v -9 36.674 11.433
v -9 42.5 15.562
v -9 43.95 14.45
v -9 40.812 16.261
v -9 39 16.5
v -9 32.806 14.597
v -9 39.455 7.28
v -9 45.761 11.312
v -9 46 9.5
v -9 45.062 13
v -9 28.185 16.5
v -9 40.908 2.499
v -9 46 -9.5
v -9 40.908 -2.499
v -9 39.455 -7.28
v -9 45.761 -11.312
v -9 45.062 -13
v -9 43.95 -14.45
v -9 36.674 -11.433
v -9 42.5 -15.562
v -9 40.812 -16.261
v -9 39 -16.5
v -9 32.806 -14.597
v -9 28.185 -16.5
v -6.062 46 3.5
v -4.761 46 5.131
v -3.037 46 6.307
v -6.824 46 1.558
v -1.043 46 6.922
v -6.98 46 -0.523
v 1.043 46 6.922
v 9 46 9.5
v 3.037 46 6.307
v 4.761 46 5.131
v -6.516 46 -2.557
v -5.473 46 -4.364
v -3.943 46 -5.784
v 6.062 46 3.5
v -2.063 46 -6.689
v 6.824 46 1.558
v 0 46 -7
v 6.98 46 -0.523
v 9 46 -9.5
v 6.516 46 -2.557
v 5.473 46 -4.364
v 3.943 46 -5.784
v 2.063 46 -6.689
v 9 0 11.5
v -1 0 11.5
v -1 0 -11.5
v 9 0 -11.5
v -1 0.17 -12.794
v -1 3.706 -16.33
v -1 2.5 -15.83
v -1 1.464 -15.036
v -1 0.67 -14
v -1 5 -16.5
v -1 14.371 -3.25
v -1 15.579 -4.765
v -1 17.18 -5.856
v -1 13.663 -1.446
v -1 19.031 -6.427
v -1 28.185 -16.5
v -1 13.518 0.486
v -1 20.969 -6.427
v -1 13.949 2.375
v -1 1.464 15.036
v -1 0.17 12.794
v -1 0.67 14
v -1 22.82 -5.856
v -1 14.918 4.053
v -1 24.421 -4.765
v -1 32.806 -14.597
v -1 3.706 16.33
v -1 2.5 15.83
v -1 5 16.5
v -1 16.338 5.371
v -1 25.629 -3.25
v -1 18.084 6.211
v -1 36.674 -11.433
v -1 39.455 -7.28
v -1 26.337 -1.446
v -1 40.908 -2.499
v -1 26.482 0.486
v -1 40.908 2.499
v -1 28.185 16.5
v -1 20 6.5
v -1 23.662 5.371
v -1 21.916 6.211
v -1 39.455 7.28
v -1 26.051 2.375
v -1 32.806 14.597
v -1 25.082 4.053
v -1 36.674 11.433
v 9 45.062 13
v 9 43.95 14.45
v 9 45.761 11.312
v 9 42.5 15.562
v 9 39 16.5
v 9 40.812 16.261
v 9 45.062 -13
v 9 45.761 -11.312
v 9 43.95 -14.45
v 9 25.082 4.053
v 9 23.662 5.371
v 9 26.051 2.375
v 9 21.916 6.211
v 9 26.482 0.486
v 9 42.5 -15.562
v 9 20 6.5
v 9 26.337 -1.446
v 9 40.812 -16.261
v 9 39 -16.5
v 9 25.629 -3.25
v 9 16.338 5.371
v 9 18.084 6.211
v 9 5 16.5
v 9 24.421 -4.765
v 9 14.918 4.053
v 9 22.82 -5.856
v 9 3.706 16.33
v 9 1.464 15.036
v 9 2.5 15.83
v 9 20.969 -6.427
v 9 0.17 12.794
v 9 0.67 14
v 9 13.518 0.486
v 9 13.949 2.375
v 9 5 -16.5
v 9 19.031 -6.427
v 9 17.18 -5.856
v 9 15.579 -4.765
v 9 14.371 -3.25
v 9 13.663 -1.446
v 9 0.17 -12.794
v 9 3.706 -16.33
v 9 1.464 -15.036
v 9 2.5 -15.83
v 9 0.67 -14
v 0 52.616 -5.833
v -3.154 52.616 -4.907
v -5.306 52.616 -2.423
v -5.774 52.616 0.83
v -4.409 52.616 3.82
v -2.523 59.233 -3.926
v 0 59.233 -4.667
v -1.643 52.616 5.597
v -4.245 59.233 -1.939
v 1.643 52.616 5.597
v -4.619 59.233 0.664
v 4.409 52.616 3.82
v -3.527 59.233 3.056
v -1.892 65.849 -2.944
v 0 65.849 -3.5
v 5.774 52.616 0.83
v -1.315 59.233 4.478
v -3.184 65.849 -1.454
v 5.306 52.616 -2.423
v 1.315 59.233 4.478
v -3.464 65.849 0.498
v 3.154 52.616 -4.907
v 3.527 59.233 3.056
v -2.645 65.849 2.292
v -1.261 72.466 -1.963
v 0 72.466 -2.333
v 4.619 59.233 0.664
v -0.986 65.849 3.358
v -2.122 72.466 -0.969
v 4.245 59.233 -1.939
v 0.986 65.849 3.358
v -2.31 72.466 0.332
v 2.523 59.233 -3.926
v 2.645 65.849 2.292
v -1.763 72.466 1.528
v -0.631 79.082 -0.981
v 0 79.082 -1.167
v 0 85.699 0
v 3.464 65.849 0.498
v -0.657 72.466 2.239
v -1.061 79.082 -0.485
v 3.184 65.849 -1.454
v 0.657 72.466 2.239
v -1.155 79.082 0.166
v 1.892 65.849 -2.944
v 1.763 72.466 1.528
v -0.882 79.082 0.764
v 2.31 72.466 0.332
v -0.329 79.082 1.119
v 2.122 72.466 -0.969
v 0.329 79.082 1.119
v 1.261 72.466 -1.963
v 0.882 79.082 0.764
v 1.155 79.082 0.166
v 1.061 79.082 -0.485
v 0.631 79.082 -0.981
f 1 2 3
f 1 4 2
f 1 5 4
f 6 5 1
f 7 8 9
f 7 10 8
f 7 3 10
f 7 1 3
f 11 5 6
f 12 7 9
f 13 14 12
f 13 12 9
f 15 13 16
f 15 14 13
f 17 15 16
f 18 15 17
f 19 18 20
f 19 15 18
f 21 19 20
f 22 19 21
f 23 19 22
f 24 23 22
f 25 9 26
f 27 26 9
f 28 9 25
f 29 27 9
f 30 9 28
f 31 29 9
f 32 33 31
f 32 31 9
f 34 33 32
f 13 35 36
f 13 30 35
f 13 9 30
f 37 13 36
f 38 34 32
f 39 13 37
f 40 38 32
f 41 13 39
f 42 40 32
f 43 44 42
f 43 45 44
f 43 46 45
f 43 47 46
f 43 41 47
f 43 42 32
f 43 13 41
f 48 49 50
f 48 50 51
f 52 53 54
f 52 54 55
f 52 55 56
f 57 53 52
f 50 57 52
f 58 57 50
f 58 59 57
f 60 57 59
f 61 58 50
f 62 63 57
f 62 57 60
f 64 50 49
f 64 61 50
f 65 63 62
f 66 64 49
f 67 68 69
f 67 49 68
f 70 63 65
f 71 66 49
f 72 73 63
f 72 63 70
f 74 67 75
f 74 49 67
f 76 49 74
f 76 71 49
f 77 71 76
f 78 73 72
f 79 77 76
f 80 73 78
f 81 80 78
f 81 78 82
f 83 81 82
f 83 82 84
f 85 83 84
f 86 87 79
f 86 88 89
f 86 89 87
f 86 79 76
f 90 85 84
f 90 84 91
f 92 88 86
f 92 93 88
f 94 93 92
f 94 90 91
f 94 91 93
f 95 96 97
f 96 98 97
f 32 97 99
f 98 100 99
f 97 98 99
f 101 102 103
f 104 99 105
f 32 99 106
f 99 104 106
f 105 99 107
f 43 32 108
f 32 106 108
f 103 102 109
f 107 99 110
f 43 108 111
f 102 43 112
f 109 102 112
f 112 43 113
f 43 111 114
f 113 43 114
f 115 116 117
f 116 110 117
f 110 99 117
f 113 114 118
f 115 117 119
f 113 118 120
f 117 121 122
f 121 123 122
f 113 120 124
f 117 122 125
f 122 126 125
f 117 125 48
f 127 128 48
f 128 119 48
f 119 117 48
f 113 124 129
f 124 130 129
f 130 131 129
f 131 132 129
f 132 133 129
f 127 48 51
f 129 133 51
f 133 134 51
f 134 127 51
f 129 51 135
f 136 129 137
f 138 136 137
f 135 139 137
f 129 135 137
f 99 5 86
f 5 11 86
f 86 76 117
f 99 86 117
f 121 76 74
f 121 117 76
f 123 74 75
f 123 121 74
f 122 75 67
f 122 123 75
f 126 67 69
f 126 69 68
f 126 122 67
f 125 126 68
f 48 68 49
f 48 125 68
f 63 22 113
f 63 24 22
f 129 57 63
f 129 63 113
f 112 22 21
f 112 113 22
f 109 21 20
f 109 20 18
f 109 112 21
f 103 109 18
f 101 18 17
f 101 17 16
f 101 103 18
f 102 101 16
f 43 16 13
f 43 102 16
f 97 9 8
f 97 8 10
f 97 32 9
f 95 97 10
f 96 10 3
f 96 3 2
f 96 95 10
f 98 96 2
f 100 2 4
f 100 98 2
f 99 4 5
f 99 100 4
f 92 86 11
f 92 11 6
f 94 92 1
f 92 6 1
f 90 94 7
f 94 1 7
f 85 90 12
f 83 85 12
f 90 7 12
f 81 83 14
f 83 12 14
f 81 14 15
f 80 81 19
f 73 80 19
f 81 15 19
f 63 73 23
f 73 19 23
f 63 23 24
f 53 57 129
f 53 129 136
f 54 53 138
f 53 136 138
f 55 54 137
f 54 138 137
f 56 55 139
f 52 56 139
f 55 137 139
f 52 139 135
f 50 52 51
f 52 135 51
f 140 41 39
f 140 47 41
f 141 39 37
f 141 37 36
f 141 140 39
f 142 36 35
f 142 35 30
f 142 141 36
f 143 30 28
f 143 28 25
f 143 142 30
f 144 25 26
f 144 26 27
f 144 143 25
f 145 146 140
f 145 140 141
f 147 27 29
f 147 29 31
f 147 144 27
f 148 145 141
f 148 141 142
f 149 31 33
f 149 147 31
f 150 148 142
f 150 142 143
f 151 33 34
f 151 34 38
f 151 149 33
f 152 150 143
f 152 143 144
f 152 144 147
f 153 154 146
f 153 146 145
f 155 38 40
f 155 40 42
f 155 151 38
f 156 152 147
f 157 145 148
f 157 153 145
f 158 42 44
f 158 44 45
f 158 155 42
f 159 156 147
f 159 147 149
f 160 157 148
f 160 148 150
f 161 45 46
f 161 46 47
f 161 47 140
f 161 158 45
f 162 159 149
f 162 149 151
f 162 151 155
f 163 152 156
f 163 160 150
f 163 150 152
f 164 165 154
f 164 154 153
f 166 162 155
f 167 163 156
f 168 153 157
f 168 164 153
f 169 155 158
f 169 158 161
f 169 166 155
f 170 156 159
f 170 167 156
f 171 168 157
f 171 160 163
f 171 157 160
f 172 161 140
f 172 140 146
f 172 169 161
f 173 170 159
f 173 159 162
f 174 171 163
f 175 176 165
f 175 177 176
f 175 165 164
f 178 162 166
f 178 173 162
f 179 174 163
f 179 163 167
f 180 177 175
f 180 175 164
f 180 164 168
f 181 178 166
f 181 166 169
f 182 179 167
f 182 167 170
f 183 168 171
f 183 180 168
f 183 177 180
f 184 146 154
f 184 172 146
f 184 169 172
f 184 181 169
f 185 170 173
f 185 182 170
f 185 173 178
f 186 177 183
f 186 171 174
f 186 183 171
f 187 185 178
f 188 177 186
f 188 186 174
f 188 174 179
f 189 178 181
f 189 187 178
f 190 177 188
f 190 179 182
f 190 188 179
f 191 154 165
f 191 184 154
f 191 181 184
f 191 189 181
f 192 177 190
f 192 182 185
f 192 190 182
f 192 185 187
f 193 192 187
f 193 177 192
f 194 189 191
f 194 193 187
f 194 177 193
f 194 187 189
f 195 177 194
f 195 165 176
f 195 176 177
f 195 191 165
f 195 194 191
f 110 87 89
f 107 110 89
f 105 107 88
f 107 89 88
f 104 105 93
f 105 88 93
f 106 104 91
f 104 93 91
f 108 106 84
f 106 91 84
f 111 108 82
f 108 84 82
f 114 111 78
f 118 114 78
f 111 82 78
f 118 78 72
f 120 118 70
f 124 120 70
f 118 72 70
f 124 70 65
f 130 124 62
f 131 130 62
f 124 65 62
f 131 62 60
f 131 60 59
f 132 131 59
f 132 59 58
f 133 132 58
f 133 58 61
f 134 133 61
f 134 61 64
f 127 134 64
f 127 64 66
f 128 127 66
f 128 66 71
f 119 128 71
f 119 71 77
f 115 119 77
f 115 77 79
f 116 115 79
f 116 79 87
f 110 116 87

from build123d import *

# Parameters (mm, degrees)
SKETCH1_W           = 18
SKETCH1_H           = 33
BOSS_EXTRUDE1_DEPTH = 46
CUT_EXTRUDE1_DEPTH  = 8
SKETCH4_R           = 6.5
CUT_EXTRUDE2_DEPTH  = 10
FILLET3_R           = 5
FILLET4_R           = 7
CUT_EXTRUDE3_DEPTH  = 8


with BuildPart() as part:
    # Sketch1 → Boss-Extrude1 (new body)
    with BuildSketch(Plane(origin=(0, 0, 0), x_dir=(1, 0, 0), z_dir=(0, 1, 0))):
        Rectangle(SKETCH1_W, SKETCH1_H)
    extrude(amount=BOSS_EXTRUDE1_DEPTH)

    # Boss-Extrude2 cone 1 section (through the dimple's axis) → Boss-Extrude2 (revolve)
    with BuildSketch(Plane(origin=(0, 46, 0), x_dir=(0, 0, -1), z_dir=(1, 0, 0))):
        Polygon((0, 0), (7, 0), (0, 39.698972737), align=None)
    revolve(axis=Axis((0, 46, 0), (0, 1, 0)))

    # Sketch3 → Cut-Extrude1 (cut)
    with BuildSketch(Plane.ZY.offset(9)):
        with BuildLine():
            Line((-16.5, 0), (16.5, 0))
            Line((16.5, 0), (16.5, 20))
            ThreePointArc((16.5, 20), (0, 36.5), (-16.5, 20))
            Line((-16.5, 20), (-16.5, 0))
        make_face()
    extrude(amount=-CUT_EXTRUDE1_DEPTH, mode=Mode.SUBTRACT)

    # Sketch4 → Cut-Extrude2 (cut)
    with BuildSketch(Plane.ZY.offset(1)):
        with Locations((0, 20)):
            Circle(SKETCH4_R)
    extrude(amount=-CUT_EXTRUDE2_DEPTH, mode=Mode.SUBTRACT)

    # Fillet3
    fillet3_edges = [part.edges().sort_by_distance(p)[0] for p in [
        (4, 0, 16.5),
        (4, 0, -16.5),
    ]]
    fillet(fillet3_edges, radius=FILLET3_R)

    # Fillet4
    fillet4_edges = [part.edges().sort_by_distance(p)[0] for p in [
        (0, 46, 16.5),
        (0, 46, -16.5),
    ]]
    fillet(fillet4_edges, radius=FILLET4_R)

    # Sketch6 → Cut-Extrude3 (cut)
    with BuildSketch(Plane.ZY.offset(9)):
        with BuildLine():
            Line((-16.5, 20), (16.5, 20))
            Line((16.5, 20), (16.5, 28.185352772))
            ThreePointArc((16.5, 28.185352772), (0, 41.092676386), (-16.5, 28.185352772))
            Line((-16.5, 28.185352772), (-16.5, 20))
        make_face()
    extrude(amount=-CUT_EXTRUDE3_DEPTH, mode=Mode.SUBTRACT)


solid = part.part
